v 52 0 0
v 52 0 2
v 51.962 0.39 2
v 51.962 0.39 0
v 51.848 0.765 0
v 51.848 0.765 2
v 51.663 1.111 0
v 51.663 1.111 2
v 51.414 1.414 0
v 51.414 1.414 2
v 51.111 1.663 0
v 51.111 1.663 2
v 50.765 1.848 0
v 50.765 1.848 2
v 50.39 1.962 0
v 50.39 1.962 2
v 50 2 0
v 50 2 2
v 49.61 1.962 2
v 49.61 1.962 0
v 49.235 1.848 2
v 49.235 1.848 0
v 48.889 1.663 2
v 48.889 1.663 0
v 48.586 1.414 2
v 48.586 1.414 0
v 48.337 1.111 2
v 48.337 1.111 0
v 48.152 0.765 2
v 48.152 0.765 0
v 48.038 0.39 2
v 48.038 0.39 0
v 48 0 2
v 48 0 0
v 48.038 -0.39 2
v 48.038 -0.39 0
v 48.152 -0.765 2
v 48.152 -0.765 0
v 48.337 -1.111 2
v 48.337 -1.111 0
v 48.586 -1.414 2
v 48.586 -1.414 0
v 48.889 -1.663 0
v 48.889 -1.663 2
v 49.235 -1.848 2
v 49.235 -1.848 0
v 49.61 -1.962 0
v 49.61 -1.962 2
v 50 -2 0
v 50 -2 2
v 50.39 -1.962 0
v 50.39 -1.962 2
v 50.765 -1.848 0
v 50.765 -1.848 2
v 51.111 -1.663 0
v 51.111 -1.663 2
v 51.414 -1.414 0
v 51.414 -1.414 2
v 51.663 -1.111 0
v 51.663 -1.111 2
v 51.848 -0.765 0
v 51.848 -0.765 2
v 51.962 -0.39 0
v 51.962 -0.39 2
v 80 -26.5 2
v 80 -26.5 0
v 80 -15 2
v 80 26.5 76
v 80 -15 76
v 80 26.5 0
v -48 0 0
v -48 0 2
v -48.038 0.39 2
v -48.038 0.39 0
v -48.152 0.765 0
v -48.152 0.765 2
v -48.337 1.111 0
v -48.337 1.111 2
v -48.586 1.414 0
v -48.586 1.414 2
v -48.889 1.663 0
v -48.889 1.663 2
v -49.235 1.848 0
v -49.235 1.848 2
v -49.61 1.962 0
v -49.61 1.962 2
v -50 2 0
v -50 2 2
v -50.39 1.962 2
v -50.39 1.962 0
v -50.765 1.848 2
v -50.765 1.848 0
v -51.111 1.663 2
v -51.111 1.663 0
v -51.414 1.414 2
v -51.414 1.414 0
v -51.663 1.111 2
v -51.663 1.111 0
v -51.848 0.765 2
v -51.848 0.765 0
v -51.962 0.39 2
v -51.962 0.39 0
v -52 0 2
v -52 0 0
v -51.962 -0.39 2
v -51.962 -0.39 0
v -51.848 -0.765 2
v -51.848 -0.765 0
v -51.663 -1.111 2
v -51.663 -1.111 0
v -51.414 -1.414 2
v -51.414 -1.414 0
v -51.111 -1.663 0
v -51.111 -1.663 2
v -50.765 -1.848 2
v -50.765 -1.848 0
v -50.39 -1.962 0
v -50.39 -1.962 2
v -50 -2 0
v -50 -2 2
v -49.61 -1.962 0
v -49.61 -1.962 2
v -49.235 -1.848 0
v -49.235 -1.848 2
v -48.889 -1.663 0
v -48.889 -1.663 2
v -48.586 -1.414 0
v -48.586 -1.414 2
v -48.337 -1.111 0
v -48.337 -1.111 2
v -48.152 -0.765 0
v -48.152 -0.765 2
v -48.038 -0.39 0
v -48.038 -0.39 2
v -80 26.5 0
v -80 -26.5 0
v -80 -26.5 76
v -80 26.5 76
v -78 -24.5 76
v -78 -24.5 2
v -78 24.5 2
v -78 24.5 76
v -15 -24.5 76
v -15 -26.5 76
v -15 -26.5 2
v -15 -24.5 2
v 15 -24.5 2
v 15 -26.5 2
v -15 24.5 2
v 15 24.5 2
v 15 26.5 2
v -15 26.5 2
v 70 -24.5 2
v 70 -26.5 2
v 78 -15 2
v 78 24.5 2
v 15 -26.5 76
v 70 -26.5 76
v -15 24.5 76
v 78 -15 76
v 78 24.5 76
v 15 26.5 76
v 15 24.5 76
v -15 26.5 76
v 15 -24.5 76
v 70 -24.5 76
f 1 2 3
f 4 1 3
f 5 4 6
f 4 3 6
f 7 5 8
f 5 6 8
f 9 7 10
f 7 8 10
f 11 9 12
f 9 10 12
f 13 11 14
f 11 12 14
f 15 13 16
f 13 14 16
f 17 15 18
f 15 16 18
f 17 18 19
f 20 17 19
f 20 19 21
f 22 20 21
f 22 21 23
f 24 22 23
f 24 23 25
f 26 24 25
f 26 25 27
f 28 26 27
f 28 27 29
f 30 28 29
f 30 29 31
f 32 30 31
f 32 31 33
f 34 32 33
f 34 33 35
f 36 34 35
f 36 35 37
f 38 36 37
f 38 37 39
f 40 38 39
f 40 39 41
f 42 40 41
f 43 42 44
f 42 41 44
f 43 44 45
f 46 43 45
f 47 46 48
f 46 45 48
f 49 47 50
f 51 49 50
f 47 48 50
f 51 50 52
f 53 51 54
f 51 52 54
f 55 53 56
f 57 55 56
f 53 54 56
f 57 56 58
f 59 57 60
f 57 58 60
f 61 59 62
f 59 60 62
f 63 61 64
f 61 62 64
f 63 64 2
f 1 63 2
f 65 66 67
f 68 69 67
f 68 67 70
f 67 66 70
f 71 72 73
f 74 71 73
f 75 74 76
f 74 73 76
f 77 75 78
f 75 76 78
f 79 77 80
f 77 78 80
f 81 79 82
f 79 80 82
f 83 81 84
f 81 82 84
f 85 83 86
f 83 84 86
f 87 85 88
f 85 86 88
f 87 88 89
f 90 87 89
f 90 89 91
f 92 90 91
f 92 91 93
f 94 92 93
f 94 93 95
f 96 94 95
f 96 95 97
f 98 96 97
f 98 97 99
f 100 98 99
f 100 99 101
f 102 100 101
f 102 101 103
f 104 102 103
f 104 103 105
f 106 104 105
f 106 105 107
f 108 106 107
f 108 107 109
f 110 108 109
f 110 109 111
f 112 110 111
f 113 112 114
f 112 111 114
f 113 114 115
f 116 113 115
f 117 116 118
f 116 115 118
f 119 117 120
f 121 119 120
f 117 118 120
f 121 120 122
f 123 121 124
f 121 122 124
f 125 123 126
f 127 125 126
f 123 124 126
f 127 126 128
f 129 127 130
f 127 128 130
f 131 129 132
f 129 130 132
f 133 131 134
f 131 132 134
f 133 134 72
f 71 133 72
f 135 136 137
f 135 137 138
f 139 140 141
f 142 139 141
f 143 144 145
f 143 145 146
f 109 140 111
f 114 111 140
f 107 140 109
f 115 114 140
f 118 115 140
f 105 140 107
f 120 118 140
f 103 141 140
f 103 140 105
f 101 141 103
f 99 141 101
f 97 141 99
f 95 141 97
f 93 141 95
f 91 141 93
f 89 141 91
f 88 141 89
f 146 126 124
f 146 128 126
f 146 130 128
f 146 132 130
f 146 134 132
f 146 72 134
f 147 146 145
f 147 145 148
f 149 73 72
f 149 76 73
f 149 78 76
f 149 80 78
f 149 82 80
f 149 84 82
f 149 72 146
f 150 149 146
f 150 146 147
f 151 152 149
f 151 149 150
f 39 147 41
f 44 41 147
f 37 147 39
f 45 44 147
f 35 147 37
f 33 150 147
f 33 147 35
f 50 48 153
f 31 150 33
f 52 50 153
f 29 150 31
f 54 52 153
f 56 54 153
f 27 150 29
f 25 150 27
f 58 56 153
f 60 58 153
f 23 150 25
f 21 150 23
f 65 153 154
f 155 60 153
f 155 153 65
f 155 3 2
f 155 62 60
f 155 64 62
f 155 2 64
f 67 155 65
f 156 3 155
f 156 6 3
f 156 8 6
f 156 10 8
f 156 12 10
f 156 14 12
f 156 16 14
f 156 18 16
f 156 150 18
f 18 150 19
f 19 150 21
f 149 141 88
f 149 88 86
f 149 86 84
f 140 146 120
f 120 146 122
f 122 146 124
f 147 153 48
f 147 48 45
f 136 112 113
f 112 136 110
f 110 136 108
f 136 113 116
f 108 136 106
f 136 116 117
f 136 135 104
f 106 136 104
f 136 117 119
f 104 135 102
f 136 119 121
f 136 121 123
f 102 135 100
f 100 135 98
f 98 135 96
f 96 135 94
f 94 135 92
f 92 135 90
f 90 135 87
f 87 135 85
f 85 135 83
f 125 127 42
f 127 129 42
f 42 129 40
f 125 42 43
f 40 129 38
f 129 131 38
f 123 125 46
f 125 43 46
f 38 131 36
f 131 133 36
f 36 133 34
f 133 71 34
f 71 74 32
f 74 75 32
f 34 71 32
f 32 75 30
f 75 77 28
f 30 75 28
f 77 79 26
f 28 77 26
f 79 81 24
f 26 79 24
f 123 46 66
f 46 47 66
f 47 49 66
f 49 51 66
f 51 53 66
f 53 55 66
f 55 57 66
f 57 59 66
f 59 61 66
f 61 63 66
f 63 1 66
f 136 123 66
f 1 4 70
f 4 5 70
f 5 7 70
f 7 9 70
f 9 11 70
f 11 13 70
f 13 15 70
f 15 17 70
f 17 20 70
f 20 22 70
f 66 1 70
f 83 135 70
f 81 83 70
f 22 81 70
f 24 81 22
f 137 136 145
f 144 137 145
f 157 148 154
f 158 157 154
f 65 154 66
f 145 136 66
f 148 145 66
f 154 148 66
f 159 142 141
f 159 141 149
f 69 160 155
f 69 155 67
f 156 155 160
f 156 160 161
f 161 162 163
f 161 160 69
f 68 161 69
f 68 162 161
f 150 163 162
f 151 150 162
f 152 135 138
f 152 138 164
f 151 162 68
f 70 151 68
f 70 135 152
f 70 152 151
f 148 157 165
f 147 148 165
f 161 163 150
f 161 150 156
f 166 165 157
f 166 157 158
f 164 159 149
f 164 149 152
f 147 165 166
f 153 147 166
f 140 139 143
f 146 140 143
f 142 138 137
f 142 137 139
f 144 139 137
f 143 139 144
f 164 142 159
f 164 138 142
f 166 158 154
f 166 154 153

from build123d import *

# Parameters (mm, degrees)
SKETCH1_W           = 160
SKETCH1_H           = 53
BOSS_EXTRUDE1_DEPTH = 76
SKETCH2_W           = 156
SKETCH2_H           = 49
CUT_EXTRUDE1_DEPTH  = 74
CUT_EXTRUDE2_REACH  = 4
SKETCH3_R           = 2
SKETCH4_W           = 30
SKETCH4_H           = 2
SKETCH4_W_2         = 20
SKETCH4_H_2         = 20
CUT_EXTRUDE3_DEPTH  = 74


with BuildPart() as part:
    # Sketch1 → Boss-Extrude1 (new body)
    with BuildSketch(Plane.XY):
        Rectangle(SKETCH1_W, SKETCH1_H)
    extrude(amount=BOSS_EXTRUDE1_DEPTH)

    # Sketch2 → Cut-Extrude1 (cut)
    with BuildSketch(Plane.XY.offset(76)):
        Rectangle(SKETCH2_W, SKETCH2_H)
    extrude(amount=-CUT_EXTRUDE1_DEPTH, mode=Mode.SUBTRACT)

    # Sketch3 → Cut-Extrude2 (cut, up to next)
    with BuildSketch(Plane.XY.offset(2), mode=Mode.PRIVATE) as cut_extrude2_sk1:
        with Locations((50, 0)):
            Circle(SKETCH3_R)
    cut_extrude2_tool1 = extrude(cut_extrude2_sk1.sketch, amount=-CUT_EXTRUDE2_REACH, mode=Mode.PRIVATE) & part.part
    add(cut_extrude2_tool1.solids().sort_by_distance((50, 0, 2))[0], mode=Mode.SUBTRACT)
    # Sketch3 → Cut-Extrude2 (cut, up to next)
    with BuildSketch(Plane.XY.offset(2), mode=Mode.PRIVATE) as cut_extrude2_sk2:
        with Locations((-50, 0)):
            Circle(SKETCH3_R)
    cut_extrude2_tool2 = extrude(cut_extrude2_sk2.sketch, amount=-CUT_EXTRUDE2_REACH, mode=Mode.PRIVATE) & part.part
    add(cut_extrude2_tool2.solids().sort_by_distance((-50, 0, 2))[0], mode=Mode.SUBTRACT)

    # Sketch4 → Cut-Extrude3 (cut)
    with BuildSketch(Plane.XY.offset(76)):
        with Locations((0, 25.5)):
            Rectangle(SKETCH4_W, SKETCH4_H)
        with Locations((0, -25.5)):
            Rectangle(SKETCH4_W, SKETCH4_H)
        with Locations((80, -25)):
            Rectangle(SKETCH4_W_2, SKETCH4_H_2)
    extrude(amount=-CUT_EXTRUDE3_DEPTH, mode=Mode.SUBTRACT)


solid = part.part
